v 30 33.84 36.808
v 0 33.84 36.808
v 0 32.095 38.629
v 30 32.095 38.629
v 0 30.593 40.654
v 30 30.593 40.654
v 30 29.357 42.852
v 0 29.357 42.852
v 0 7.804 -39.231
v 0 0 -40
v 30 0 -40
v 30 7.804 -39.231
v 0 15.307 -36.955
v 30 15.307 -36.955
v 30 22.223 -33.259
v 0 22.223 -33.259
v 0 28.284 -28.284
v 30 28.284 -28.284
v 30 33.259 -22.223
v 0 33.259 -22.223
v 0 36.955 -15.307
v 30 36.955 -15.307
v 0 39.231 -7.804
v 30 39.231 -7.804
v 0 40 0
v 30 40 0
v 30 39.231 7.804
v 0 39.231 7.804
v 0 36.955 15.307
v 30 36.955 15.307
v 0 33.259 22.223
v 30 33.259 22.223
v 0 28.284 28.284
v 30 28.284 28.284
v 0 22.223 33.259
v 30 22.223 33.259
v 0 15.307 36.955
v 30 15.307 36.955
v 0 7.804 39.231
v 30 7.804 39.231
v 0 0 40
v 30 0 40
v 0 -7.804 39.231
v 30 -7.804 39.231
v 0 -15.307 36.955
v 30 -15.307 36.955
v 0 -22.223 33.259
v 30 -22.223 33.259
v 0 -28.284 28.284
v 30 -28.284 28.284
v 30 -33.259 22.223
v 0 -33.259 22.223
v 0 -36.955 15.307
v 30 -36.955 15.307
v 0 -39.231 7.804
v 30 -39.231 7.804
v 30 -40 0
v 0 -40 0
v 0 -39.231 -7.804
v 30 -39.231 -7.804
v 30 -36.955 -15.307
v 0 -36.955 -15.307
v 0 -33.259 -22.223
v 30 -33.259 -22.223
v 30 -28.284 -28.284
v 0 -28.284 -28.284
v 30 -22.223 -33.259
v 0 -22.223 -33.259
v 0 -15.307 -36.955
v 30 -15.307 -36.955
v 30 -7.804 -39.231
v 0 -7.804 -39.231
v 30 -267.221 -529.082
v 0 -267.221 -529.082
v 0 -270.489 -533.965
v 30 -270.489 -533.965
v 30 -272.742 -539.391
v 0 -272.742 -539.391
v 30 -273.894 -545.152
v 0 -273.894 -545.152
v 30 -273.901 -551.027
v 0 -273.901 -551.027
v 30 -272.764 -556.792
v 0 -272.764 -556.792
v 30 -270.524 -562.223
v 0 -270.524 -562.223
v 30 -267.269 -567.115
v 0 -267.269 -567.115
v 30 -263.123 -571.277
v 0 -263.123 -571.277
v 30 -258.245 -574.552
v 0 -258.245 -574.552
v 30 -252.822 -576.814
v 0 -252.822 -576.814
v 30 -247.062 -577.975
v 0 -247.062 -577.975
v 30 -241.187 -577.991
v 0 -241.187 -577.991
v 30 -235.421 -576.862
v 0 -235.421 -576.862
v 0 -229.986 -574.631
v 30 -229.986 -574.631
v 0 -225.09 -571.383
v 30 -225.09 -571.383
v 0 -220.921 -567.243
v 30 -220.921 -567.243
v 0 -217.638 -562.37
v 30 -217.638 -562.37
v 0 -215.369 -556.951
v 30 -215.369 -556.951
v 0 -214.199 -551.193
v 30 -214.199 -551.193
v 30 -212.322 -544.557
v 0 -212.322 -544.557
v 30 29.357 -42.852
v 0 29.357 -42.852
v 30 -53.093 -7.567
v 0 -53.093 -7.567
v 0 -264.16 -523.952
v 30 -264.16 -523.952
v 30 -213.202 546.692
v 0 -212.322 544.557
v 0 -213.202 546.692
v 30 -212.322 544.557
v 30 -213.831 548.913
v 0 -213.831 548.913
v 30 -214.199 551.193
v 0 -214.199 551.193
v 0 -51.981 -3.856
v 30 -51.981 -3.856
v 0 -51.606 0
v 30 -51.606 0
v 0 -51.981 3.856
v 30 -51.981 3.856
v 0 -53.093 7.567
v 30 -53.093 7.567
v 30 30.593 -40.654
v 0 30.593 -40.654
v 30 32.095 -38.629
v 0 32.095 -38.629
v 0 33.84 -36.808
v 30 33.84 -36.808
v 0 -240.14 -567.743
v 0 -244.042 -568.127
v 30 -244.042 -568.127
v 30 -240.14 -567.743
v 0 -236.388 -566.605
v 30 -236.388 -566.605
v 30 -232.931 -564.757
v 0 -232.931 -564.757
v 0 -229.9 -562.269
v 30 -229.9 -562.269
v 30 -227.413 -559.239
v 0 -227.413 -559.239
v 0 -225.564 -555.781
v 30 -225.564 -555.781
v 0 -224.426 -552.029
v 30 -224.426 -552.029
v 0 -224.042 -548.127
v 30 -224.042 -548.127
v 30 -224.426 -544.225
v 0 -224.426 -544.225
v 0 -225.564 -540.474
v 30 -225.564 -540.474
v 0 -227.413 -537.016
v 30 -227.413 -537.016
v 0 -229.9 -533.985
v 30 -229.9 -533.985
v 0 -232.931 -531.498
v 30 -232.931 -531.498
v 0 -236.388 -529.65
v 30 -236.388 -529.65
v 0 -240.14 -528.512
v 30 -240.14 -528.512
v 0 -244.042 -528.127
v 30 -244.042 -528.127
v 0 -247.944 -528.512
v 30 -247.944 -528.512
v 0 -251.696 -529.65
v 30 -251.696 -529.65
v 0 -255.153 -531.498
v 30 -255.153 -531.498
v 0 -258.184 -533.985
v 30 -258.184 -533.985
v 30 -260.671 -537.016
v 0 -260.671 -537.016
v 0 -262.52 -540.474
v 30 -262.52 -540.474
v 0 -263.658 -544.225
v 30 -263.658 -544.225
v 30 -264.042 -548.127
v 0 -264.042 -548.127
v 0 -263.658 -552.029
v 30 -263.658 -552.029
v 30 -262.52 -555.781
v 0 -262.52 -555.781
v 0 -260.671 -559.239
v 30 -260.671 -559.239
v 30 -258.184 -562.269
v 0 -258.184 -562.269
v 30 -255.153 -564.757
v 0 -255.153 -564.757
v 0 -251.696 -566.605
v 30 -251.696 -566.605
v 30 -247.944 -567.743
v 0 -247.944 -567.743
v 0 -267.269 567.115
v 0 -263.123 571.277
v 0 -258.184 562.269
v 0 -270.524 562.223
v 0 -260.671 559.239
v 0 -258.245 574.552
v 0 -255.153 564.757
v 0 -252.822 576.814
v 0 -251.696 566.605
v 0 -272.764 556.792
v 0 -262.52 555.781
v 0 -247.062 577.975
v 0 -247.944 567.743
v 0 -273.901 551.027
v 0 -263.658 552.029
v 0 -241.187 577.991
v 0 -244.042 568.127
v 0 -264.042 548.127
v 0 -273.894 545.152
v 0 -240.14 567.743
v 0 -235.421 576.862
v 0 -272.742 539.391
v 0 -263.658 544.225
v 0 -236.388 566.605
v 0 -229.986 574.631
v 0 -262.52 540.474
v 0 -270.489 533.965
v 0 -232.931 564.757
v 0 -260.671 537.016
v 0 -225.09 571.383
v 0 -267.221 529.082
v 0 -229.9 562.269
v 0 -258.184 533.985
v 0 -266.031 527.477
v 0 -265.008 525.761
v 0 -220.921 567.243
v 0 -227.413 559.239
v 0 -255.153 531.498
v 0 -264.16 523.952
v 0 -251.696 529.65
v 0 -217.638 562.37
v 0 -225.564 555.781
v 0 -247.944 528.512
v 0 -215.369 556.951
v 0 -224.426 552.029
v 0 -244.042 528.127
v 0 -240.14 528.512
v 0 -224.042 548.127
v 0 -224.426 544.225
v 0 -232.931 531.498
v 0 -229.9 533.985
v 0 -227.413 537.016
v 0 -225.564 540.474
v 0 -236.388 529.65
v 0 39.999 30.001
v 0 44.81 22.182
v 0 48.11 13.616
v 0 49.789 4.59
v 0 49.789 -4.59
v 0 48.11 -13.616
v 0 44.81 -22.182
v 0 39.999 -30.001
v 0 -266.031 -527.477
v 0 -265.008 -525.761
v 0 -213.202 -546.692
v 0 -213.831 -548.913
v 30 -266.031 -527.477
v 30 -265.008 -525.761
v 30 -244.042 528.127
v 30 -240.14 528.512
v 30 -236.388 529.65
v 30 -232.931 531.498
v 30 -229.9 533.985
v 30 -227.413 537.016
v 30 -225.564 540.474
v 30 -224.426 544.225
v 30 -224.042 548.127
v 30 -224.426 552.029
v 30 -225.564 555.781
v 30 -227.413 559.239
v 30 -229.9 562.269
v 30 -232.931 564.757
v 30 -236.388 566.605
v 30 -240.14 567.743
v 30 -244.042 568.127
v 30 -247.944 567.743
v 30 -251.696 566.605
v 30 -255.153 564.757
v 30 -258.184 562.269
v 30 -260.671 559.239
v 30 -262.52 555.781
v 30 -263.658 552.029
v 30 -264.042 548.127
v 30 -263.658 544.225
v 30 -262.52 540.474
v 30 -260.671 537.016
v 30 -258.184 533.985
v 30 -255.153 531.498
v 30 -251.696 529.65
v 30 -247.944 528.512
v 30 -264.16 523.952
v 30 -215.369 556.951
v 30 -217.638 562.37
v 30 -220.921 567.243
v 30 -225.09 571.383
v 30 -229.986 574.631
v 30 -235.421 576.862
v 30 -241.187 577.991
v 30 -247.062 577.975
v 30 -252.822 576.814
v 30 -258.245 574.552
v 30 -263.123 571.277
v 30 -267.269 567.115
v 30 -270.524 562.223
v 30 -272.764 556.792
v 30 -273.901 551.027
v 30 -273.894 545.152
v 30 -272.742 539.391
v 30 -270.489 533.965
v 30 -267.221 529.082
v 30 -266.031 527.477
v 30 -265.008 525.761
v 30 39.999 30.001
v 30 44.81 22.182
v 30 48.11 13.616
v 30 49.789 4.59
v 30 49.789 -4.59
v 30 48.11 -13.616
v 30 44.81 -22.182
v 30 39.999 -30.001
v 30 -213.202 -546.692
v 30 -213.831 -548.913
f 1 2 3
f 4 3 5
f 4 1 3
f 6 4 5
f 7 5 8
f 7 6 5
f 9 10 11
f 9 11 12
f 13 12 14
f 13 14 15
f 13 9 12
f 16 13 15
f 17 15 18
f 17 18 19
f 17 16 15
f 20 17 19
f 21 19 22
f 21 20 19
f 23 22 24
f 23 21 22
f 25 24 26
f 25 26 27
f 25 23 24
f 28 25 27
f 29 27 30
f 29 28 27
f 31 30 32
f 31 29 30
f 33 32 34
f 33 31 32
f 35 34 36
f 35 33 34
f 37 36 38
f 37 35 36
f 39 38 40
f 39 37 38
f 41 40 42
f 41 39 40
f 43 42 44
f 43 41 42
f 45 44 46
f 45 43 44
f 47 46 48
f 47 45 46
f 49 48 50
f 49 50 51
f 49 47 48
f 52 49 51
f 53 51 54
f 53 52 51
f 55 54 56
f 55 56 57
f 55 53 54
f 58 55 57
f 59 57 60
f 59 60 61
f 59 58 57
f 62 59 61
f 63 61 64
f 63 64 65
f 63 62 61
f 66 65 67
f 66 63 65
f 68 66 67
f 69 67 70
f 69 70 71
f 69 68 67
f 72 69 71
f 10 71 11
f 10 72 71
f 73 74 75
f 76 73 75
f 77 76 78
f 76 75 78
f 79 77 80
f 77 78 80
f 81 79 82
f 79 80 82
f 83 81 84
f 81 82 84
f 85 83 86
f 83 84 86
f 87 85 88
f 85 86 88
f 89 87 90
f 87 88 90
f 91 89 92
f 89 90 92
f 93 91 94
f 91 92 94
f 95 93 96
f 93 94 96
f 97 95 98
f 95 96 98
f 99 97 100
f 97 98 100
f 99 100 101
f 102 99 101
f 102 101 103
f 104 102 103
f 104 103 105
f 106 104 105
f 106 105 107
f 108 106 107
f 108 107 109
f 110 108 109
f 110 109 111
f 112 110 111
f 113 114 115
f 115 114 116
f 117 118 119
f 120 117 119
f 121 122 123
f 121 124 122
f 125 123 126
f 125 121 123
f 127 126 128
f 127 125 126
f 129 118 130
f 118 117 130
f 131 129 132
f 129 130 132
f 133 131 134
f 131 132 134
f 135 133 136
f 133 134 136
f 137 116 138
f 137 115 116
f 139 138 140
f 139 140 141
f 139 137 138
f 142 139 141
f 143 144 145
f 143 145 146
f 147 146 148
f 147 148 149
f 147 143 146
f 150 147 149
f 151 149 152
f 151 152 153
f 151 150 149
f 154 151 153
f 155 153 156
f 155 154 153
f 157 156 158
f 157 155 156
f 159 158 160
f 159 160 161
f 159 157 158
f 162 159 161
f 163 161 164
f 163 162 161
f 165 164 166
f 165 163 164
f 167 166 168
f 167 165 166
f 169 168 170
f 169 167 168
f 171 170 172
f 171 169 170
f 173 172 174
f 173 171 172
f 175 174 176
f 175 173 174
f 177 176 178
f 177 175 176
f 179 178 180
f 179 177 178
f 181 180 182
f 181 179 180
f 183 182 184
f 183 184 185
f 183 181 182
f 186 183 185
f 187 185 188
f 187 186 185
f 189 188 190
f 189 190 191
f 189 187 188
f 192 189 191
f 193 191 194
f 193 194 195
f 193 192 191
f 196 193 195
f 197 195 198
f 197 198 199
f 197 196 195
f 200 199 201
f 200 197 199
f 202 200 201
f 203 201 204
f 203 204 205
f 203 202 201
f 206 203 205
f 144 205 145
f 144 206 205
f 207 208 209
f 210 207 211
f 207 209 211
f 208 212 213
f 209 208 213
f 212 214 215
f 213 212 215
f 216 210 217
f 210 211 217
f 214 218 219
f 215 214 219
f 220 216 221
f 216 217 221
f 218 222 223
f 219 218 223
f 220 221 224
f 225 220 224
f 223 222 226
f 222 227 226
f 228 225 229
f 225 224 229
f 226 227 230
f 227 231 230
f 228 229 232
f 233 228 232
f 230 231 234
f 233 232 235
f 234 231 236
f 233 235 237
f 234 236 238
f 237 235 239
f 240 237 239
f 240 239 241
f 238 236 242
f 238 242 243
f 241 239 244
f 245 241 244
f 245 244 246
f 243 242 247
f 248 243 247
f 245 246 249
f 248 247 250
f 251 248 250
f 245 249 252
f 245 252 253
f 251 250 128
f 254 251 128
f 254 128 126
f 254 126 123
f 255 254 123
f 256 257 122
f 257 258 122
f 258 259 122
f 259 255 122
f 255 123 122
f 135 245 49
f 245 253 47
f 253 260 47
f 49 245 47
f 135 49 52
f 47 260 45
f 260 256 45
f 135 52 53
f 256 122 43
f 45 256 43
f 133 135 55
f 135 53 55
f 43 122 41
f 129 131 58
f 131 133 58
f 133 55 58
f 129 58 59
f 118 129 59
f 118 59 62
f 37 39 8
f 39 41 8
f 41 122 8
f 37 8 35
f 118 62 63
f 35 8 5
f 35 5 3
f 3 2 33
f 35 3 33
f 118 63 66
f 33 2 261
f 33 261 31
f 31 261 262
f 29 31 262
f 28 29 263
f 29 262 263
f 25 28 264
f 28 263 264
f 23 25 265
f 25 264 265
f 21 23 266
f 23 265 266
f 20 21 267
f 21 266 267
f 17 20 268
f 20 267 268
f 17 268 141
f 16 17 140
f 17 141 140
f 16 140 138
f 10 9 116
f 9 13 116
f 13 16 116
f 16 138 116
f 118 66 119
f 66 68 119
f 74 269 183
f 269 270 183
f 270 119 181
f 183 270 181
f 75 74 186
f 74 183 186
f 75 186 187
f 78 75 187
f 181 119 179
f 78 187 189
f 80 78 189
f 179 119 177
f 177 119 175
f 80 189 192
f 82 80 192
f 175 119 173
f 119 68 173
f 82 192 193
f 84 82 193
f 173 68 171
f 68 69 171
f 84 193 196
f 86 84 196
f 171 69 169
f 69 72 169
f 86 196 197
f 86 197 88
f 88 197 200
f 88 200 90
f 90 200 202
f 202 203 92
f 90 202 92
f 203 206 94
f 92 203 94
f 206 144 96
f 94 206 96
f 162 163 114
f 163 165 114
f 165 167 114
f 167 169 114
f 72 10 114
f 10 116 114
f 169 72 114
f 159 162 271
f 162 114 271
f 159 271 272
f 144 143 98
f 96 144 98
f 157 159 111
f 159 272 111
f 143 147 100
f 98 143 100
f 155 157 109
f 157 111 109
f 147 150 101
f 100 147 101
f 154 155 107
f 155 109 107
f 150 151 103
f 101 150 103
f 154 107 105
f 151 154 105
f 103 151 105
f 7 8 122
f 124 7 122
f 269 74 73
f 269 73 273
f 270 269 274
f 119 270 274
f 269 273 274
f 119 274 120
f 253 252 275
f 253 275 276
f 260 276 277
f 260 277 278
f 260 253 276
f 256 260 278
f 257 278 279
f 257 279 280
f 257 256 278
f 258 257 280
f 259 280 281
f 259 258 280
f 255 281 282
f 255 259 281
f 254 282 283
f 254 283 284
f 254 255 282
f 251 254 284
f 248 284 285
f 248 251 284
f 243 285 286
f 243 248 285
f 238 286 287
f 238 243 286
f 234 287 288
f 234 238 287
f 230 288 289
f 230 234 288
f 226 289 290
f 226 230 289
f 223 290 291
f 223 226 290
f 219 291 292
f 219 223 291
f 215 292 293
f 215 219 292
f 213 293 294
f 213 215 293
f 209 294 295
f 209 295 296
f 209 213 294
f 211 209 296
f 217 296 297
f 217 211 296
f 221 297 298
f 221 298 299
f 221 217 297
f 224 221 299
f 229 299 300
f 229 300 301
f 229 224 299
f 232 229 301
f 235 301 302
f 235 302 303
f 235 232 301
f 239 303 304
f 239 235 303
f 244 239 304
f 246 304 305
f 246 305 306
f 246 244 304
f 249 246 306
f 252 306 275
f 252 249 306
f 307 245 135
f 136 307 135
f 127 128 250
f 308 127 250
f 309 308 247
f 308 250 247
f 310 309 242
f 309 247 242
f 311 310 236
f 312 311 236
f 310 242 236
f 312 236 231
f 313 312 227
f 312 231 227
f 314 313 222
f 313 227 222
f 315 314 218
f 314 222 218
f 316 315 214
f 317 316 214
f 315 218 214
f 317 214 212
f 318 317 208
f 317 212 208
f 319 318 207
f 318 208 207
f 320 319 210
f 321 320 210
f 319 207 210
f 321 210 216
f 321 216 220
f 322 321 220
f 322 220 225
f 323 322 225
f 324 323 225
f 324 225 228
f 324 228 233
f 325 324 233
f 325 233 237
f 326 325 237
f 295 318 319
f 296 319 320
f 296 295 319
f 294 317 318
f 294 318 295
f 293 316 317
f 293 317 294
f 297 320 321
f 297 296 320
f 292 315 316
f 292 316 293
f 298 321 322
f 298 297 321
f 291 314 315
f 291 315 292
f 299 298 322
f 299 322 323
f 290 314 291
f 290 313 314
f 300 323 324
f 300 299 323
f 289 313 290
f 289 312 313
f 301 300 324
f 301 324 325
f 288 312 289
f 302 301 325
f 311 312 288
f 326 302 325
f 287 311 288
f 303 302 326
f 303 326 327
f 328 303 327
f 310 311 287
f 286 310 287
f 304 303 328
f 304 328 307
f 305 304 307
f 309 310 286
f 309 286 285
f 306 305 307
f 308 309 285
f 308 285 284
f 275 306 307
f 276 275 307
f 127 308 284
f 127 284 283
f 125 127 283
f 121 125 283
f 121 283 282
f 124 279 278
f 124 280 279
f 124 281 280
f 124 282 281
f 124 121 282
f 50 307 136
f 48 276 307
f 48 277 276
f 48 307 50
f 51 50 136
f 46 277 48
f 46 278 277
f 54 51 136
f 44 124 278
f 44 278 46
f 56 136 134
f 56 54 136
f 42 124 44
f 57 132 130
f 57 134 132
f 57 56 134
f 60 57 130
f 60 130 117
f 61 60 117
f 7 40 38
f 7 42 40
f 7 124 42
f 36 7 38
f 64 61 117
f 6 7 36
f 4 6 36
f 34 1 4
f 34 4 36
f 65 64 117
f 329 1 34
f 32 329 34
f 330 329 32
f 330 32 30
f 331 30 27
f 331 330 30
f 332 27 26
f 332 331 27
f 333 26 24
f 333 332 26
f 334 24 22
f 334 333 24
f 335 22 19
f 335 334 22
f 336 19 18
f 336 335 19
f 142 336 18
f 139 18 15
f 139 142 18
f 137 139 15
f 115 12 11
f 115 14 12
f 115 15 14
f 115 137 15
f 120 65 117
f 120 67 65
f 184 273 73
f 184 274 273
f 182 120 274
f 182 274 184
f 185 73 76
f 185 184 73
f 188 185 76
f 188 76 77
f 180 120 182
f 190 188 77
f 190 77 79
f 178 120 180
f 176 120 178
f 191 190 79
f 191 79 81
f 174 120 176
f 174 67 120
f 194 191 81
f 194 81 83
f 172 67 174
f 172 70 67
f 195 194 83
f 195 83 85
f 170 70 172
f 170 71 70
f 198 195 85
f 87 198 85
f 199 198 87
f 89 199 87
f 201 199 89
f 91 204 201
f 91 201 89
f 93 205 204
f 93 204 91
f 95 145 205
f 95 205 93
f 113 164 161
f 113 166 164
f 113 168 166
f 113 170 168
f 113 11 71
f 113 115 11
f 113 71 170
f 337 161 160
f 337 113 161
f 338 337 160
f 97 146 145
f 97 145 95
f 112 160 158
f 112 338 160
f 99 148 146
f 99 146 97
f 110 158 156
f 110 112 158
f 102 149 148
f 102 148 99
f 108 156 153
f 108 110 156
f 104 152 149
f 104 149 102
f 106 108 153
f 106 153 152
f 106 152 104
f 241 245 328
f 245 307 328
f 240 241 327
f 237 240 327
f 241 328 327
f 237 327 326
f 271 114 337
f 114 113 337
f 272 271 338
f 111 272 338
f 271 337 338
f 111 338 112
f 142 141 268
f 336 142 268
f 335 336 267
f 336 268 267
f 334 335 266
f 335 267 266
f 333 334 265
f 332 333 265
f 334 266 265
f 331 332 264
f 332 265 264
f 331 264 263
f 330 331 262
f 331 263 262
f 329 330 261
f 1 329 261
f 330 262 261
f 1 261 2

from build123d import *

# Parameters (mm, degrees)
SKETCH1_R           = 40
SKETCH1_R_2         = 20
BOSS_EXTRUDE1_DEPTH = 30
FILLET1_R           = 20


with BuildPart() as part:
    # Sketch1 → Boss-Extrude1 (new body)
    with BuildSketch(Plane(origin=(0, 0, 0), x_dir=(0, 0, -1), z_dir=(1, 0, 0))):
        with BuildLine():
            Line((548.127274586, -214.041985845), (39.098756603, 31.16548142))
            ThreePointArc((39.098756603, 31.16548142), (0, 50), (-39.098756603, 31.16548142))
            Line((-39.098756603, 31.16548142), (-548.127274586, -214.041985845))
            ThreePointArc((-548.127274586, -214.041985845), (-575.897089096, -255.392642304), (-527.11356629, -265.452825709))
            Line((-527.11356629, -265.452825709), (0, -50))
            Line((0, -50), (527.11356629, -265.452825709))
            ThreePointArc((527.11356629, -265.452825709), (575.897089096, -255.392642304), (548.127274586, -214.041985845))
        make_face()
        Circle(SKETCH1_R, mode=Mode.SUBTRACT)
        with Locations((-548.127274586, -244.041985845)):
            Circle(SKETCH1_R_2, mode=Mode.SUBTRACT)
        with Locations((548.127274586, -244.041985845)):
            Circle(SKETCH1_R_2, mode=Mode.SUBTRACT)
    extrude(amount=BOSS_EXTRUDE1_DEPTH)

    # Fillet1
    fillet1_edges = [part.edges().sort_by_distance(p)[0] for p in [
        (15, -265.452825709, -527.11356629),
        (15, -214.041985845, -548.127274586),
        (15, 31.16548142, -39.098756603),
        (15, -214.041985845, 548.127274586),
        (15, 31.16548142, 39.098756603),
        (15, -50, 0),
        (15, -265.452825709, 527.11356629),
    ]]
    fillet(fillet1_edges, radius=FILLET1_R)


solid = part.part
